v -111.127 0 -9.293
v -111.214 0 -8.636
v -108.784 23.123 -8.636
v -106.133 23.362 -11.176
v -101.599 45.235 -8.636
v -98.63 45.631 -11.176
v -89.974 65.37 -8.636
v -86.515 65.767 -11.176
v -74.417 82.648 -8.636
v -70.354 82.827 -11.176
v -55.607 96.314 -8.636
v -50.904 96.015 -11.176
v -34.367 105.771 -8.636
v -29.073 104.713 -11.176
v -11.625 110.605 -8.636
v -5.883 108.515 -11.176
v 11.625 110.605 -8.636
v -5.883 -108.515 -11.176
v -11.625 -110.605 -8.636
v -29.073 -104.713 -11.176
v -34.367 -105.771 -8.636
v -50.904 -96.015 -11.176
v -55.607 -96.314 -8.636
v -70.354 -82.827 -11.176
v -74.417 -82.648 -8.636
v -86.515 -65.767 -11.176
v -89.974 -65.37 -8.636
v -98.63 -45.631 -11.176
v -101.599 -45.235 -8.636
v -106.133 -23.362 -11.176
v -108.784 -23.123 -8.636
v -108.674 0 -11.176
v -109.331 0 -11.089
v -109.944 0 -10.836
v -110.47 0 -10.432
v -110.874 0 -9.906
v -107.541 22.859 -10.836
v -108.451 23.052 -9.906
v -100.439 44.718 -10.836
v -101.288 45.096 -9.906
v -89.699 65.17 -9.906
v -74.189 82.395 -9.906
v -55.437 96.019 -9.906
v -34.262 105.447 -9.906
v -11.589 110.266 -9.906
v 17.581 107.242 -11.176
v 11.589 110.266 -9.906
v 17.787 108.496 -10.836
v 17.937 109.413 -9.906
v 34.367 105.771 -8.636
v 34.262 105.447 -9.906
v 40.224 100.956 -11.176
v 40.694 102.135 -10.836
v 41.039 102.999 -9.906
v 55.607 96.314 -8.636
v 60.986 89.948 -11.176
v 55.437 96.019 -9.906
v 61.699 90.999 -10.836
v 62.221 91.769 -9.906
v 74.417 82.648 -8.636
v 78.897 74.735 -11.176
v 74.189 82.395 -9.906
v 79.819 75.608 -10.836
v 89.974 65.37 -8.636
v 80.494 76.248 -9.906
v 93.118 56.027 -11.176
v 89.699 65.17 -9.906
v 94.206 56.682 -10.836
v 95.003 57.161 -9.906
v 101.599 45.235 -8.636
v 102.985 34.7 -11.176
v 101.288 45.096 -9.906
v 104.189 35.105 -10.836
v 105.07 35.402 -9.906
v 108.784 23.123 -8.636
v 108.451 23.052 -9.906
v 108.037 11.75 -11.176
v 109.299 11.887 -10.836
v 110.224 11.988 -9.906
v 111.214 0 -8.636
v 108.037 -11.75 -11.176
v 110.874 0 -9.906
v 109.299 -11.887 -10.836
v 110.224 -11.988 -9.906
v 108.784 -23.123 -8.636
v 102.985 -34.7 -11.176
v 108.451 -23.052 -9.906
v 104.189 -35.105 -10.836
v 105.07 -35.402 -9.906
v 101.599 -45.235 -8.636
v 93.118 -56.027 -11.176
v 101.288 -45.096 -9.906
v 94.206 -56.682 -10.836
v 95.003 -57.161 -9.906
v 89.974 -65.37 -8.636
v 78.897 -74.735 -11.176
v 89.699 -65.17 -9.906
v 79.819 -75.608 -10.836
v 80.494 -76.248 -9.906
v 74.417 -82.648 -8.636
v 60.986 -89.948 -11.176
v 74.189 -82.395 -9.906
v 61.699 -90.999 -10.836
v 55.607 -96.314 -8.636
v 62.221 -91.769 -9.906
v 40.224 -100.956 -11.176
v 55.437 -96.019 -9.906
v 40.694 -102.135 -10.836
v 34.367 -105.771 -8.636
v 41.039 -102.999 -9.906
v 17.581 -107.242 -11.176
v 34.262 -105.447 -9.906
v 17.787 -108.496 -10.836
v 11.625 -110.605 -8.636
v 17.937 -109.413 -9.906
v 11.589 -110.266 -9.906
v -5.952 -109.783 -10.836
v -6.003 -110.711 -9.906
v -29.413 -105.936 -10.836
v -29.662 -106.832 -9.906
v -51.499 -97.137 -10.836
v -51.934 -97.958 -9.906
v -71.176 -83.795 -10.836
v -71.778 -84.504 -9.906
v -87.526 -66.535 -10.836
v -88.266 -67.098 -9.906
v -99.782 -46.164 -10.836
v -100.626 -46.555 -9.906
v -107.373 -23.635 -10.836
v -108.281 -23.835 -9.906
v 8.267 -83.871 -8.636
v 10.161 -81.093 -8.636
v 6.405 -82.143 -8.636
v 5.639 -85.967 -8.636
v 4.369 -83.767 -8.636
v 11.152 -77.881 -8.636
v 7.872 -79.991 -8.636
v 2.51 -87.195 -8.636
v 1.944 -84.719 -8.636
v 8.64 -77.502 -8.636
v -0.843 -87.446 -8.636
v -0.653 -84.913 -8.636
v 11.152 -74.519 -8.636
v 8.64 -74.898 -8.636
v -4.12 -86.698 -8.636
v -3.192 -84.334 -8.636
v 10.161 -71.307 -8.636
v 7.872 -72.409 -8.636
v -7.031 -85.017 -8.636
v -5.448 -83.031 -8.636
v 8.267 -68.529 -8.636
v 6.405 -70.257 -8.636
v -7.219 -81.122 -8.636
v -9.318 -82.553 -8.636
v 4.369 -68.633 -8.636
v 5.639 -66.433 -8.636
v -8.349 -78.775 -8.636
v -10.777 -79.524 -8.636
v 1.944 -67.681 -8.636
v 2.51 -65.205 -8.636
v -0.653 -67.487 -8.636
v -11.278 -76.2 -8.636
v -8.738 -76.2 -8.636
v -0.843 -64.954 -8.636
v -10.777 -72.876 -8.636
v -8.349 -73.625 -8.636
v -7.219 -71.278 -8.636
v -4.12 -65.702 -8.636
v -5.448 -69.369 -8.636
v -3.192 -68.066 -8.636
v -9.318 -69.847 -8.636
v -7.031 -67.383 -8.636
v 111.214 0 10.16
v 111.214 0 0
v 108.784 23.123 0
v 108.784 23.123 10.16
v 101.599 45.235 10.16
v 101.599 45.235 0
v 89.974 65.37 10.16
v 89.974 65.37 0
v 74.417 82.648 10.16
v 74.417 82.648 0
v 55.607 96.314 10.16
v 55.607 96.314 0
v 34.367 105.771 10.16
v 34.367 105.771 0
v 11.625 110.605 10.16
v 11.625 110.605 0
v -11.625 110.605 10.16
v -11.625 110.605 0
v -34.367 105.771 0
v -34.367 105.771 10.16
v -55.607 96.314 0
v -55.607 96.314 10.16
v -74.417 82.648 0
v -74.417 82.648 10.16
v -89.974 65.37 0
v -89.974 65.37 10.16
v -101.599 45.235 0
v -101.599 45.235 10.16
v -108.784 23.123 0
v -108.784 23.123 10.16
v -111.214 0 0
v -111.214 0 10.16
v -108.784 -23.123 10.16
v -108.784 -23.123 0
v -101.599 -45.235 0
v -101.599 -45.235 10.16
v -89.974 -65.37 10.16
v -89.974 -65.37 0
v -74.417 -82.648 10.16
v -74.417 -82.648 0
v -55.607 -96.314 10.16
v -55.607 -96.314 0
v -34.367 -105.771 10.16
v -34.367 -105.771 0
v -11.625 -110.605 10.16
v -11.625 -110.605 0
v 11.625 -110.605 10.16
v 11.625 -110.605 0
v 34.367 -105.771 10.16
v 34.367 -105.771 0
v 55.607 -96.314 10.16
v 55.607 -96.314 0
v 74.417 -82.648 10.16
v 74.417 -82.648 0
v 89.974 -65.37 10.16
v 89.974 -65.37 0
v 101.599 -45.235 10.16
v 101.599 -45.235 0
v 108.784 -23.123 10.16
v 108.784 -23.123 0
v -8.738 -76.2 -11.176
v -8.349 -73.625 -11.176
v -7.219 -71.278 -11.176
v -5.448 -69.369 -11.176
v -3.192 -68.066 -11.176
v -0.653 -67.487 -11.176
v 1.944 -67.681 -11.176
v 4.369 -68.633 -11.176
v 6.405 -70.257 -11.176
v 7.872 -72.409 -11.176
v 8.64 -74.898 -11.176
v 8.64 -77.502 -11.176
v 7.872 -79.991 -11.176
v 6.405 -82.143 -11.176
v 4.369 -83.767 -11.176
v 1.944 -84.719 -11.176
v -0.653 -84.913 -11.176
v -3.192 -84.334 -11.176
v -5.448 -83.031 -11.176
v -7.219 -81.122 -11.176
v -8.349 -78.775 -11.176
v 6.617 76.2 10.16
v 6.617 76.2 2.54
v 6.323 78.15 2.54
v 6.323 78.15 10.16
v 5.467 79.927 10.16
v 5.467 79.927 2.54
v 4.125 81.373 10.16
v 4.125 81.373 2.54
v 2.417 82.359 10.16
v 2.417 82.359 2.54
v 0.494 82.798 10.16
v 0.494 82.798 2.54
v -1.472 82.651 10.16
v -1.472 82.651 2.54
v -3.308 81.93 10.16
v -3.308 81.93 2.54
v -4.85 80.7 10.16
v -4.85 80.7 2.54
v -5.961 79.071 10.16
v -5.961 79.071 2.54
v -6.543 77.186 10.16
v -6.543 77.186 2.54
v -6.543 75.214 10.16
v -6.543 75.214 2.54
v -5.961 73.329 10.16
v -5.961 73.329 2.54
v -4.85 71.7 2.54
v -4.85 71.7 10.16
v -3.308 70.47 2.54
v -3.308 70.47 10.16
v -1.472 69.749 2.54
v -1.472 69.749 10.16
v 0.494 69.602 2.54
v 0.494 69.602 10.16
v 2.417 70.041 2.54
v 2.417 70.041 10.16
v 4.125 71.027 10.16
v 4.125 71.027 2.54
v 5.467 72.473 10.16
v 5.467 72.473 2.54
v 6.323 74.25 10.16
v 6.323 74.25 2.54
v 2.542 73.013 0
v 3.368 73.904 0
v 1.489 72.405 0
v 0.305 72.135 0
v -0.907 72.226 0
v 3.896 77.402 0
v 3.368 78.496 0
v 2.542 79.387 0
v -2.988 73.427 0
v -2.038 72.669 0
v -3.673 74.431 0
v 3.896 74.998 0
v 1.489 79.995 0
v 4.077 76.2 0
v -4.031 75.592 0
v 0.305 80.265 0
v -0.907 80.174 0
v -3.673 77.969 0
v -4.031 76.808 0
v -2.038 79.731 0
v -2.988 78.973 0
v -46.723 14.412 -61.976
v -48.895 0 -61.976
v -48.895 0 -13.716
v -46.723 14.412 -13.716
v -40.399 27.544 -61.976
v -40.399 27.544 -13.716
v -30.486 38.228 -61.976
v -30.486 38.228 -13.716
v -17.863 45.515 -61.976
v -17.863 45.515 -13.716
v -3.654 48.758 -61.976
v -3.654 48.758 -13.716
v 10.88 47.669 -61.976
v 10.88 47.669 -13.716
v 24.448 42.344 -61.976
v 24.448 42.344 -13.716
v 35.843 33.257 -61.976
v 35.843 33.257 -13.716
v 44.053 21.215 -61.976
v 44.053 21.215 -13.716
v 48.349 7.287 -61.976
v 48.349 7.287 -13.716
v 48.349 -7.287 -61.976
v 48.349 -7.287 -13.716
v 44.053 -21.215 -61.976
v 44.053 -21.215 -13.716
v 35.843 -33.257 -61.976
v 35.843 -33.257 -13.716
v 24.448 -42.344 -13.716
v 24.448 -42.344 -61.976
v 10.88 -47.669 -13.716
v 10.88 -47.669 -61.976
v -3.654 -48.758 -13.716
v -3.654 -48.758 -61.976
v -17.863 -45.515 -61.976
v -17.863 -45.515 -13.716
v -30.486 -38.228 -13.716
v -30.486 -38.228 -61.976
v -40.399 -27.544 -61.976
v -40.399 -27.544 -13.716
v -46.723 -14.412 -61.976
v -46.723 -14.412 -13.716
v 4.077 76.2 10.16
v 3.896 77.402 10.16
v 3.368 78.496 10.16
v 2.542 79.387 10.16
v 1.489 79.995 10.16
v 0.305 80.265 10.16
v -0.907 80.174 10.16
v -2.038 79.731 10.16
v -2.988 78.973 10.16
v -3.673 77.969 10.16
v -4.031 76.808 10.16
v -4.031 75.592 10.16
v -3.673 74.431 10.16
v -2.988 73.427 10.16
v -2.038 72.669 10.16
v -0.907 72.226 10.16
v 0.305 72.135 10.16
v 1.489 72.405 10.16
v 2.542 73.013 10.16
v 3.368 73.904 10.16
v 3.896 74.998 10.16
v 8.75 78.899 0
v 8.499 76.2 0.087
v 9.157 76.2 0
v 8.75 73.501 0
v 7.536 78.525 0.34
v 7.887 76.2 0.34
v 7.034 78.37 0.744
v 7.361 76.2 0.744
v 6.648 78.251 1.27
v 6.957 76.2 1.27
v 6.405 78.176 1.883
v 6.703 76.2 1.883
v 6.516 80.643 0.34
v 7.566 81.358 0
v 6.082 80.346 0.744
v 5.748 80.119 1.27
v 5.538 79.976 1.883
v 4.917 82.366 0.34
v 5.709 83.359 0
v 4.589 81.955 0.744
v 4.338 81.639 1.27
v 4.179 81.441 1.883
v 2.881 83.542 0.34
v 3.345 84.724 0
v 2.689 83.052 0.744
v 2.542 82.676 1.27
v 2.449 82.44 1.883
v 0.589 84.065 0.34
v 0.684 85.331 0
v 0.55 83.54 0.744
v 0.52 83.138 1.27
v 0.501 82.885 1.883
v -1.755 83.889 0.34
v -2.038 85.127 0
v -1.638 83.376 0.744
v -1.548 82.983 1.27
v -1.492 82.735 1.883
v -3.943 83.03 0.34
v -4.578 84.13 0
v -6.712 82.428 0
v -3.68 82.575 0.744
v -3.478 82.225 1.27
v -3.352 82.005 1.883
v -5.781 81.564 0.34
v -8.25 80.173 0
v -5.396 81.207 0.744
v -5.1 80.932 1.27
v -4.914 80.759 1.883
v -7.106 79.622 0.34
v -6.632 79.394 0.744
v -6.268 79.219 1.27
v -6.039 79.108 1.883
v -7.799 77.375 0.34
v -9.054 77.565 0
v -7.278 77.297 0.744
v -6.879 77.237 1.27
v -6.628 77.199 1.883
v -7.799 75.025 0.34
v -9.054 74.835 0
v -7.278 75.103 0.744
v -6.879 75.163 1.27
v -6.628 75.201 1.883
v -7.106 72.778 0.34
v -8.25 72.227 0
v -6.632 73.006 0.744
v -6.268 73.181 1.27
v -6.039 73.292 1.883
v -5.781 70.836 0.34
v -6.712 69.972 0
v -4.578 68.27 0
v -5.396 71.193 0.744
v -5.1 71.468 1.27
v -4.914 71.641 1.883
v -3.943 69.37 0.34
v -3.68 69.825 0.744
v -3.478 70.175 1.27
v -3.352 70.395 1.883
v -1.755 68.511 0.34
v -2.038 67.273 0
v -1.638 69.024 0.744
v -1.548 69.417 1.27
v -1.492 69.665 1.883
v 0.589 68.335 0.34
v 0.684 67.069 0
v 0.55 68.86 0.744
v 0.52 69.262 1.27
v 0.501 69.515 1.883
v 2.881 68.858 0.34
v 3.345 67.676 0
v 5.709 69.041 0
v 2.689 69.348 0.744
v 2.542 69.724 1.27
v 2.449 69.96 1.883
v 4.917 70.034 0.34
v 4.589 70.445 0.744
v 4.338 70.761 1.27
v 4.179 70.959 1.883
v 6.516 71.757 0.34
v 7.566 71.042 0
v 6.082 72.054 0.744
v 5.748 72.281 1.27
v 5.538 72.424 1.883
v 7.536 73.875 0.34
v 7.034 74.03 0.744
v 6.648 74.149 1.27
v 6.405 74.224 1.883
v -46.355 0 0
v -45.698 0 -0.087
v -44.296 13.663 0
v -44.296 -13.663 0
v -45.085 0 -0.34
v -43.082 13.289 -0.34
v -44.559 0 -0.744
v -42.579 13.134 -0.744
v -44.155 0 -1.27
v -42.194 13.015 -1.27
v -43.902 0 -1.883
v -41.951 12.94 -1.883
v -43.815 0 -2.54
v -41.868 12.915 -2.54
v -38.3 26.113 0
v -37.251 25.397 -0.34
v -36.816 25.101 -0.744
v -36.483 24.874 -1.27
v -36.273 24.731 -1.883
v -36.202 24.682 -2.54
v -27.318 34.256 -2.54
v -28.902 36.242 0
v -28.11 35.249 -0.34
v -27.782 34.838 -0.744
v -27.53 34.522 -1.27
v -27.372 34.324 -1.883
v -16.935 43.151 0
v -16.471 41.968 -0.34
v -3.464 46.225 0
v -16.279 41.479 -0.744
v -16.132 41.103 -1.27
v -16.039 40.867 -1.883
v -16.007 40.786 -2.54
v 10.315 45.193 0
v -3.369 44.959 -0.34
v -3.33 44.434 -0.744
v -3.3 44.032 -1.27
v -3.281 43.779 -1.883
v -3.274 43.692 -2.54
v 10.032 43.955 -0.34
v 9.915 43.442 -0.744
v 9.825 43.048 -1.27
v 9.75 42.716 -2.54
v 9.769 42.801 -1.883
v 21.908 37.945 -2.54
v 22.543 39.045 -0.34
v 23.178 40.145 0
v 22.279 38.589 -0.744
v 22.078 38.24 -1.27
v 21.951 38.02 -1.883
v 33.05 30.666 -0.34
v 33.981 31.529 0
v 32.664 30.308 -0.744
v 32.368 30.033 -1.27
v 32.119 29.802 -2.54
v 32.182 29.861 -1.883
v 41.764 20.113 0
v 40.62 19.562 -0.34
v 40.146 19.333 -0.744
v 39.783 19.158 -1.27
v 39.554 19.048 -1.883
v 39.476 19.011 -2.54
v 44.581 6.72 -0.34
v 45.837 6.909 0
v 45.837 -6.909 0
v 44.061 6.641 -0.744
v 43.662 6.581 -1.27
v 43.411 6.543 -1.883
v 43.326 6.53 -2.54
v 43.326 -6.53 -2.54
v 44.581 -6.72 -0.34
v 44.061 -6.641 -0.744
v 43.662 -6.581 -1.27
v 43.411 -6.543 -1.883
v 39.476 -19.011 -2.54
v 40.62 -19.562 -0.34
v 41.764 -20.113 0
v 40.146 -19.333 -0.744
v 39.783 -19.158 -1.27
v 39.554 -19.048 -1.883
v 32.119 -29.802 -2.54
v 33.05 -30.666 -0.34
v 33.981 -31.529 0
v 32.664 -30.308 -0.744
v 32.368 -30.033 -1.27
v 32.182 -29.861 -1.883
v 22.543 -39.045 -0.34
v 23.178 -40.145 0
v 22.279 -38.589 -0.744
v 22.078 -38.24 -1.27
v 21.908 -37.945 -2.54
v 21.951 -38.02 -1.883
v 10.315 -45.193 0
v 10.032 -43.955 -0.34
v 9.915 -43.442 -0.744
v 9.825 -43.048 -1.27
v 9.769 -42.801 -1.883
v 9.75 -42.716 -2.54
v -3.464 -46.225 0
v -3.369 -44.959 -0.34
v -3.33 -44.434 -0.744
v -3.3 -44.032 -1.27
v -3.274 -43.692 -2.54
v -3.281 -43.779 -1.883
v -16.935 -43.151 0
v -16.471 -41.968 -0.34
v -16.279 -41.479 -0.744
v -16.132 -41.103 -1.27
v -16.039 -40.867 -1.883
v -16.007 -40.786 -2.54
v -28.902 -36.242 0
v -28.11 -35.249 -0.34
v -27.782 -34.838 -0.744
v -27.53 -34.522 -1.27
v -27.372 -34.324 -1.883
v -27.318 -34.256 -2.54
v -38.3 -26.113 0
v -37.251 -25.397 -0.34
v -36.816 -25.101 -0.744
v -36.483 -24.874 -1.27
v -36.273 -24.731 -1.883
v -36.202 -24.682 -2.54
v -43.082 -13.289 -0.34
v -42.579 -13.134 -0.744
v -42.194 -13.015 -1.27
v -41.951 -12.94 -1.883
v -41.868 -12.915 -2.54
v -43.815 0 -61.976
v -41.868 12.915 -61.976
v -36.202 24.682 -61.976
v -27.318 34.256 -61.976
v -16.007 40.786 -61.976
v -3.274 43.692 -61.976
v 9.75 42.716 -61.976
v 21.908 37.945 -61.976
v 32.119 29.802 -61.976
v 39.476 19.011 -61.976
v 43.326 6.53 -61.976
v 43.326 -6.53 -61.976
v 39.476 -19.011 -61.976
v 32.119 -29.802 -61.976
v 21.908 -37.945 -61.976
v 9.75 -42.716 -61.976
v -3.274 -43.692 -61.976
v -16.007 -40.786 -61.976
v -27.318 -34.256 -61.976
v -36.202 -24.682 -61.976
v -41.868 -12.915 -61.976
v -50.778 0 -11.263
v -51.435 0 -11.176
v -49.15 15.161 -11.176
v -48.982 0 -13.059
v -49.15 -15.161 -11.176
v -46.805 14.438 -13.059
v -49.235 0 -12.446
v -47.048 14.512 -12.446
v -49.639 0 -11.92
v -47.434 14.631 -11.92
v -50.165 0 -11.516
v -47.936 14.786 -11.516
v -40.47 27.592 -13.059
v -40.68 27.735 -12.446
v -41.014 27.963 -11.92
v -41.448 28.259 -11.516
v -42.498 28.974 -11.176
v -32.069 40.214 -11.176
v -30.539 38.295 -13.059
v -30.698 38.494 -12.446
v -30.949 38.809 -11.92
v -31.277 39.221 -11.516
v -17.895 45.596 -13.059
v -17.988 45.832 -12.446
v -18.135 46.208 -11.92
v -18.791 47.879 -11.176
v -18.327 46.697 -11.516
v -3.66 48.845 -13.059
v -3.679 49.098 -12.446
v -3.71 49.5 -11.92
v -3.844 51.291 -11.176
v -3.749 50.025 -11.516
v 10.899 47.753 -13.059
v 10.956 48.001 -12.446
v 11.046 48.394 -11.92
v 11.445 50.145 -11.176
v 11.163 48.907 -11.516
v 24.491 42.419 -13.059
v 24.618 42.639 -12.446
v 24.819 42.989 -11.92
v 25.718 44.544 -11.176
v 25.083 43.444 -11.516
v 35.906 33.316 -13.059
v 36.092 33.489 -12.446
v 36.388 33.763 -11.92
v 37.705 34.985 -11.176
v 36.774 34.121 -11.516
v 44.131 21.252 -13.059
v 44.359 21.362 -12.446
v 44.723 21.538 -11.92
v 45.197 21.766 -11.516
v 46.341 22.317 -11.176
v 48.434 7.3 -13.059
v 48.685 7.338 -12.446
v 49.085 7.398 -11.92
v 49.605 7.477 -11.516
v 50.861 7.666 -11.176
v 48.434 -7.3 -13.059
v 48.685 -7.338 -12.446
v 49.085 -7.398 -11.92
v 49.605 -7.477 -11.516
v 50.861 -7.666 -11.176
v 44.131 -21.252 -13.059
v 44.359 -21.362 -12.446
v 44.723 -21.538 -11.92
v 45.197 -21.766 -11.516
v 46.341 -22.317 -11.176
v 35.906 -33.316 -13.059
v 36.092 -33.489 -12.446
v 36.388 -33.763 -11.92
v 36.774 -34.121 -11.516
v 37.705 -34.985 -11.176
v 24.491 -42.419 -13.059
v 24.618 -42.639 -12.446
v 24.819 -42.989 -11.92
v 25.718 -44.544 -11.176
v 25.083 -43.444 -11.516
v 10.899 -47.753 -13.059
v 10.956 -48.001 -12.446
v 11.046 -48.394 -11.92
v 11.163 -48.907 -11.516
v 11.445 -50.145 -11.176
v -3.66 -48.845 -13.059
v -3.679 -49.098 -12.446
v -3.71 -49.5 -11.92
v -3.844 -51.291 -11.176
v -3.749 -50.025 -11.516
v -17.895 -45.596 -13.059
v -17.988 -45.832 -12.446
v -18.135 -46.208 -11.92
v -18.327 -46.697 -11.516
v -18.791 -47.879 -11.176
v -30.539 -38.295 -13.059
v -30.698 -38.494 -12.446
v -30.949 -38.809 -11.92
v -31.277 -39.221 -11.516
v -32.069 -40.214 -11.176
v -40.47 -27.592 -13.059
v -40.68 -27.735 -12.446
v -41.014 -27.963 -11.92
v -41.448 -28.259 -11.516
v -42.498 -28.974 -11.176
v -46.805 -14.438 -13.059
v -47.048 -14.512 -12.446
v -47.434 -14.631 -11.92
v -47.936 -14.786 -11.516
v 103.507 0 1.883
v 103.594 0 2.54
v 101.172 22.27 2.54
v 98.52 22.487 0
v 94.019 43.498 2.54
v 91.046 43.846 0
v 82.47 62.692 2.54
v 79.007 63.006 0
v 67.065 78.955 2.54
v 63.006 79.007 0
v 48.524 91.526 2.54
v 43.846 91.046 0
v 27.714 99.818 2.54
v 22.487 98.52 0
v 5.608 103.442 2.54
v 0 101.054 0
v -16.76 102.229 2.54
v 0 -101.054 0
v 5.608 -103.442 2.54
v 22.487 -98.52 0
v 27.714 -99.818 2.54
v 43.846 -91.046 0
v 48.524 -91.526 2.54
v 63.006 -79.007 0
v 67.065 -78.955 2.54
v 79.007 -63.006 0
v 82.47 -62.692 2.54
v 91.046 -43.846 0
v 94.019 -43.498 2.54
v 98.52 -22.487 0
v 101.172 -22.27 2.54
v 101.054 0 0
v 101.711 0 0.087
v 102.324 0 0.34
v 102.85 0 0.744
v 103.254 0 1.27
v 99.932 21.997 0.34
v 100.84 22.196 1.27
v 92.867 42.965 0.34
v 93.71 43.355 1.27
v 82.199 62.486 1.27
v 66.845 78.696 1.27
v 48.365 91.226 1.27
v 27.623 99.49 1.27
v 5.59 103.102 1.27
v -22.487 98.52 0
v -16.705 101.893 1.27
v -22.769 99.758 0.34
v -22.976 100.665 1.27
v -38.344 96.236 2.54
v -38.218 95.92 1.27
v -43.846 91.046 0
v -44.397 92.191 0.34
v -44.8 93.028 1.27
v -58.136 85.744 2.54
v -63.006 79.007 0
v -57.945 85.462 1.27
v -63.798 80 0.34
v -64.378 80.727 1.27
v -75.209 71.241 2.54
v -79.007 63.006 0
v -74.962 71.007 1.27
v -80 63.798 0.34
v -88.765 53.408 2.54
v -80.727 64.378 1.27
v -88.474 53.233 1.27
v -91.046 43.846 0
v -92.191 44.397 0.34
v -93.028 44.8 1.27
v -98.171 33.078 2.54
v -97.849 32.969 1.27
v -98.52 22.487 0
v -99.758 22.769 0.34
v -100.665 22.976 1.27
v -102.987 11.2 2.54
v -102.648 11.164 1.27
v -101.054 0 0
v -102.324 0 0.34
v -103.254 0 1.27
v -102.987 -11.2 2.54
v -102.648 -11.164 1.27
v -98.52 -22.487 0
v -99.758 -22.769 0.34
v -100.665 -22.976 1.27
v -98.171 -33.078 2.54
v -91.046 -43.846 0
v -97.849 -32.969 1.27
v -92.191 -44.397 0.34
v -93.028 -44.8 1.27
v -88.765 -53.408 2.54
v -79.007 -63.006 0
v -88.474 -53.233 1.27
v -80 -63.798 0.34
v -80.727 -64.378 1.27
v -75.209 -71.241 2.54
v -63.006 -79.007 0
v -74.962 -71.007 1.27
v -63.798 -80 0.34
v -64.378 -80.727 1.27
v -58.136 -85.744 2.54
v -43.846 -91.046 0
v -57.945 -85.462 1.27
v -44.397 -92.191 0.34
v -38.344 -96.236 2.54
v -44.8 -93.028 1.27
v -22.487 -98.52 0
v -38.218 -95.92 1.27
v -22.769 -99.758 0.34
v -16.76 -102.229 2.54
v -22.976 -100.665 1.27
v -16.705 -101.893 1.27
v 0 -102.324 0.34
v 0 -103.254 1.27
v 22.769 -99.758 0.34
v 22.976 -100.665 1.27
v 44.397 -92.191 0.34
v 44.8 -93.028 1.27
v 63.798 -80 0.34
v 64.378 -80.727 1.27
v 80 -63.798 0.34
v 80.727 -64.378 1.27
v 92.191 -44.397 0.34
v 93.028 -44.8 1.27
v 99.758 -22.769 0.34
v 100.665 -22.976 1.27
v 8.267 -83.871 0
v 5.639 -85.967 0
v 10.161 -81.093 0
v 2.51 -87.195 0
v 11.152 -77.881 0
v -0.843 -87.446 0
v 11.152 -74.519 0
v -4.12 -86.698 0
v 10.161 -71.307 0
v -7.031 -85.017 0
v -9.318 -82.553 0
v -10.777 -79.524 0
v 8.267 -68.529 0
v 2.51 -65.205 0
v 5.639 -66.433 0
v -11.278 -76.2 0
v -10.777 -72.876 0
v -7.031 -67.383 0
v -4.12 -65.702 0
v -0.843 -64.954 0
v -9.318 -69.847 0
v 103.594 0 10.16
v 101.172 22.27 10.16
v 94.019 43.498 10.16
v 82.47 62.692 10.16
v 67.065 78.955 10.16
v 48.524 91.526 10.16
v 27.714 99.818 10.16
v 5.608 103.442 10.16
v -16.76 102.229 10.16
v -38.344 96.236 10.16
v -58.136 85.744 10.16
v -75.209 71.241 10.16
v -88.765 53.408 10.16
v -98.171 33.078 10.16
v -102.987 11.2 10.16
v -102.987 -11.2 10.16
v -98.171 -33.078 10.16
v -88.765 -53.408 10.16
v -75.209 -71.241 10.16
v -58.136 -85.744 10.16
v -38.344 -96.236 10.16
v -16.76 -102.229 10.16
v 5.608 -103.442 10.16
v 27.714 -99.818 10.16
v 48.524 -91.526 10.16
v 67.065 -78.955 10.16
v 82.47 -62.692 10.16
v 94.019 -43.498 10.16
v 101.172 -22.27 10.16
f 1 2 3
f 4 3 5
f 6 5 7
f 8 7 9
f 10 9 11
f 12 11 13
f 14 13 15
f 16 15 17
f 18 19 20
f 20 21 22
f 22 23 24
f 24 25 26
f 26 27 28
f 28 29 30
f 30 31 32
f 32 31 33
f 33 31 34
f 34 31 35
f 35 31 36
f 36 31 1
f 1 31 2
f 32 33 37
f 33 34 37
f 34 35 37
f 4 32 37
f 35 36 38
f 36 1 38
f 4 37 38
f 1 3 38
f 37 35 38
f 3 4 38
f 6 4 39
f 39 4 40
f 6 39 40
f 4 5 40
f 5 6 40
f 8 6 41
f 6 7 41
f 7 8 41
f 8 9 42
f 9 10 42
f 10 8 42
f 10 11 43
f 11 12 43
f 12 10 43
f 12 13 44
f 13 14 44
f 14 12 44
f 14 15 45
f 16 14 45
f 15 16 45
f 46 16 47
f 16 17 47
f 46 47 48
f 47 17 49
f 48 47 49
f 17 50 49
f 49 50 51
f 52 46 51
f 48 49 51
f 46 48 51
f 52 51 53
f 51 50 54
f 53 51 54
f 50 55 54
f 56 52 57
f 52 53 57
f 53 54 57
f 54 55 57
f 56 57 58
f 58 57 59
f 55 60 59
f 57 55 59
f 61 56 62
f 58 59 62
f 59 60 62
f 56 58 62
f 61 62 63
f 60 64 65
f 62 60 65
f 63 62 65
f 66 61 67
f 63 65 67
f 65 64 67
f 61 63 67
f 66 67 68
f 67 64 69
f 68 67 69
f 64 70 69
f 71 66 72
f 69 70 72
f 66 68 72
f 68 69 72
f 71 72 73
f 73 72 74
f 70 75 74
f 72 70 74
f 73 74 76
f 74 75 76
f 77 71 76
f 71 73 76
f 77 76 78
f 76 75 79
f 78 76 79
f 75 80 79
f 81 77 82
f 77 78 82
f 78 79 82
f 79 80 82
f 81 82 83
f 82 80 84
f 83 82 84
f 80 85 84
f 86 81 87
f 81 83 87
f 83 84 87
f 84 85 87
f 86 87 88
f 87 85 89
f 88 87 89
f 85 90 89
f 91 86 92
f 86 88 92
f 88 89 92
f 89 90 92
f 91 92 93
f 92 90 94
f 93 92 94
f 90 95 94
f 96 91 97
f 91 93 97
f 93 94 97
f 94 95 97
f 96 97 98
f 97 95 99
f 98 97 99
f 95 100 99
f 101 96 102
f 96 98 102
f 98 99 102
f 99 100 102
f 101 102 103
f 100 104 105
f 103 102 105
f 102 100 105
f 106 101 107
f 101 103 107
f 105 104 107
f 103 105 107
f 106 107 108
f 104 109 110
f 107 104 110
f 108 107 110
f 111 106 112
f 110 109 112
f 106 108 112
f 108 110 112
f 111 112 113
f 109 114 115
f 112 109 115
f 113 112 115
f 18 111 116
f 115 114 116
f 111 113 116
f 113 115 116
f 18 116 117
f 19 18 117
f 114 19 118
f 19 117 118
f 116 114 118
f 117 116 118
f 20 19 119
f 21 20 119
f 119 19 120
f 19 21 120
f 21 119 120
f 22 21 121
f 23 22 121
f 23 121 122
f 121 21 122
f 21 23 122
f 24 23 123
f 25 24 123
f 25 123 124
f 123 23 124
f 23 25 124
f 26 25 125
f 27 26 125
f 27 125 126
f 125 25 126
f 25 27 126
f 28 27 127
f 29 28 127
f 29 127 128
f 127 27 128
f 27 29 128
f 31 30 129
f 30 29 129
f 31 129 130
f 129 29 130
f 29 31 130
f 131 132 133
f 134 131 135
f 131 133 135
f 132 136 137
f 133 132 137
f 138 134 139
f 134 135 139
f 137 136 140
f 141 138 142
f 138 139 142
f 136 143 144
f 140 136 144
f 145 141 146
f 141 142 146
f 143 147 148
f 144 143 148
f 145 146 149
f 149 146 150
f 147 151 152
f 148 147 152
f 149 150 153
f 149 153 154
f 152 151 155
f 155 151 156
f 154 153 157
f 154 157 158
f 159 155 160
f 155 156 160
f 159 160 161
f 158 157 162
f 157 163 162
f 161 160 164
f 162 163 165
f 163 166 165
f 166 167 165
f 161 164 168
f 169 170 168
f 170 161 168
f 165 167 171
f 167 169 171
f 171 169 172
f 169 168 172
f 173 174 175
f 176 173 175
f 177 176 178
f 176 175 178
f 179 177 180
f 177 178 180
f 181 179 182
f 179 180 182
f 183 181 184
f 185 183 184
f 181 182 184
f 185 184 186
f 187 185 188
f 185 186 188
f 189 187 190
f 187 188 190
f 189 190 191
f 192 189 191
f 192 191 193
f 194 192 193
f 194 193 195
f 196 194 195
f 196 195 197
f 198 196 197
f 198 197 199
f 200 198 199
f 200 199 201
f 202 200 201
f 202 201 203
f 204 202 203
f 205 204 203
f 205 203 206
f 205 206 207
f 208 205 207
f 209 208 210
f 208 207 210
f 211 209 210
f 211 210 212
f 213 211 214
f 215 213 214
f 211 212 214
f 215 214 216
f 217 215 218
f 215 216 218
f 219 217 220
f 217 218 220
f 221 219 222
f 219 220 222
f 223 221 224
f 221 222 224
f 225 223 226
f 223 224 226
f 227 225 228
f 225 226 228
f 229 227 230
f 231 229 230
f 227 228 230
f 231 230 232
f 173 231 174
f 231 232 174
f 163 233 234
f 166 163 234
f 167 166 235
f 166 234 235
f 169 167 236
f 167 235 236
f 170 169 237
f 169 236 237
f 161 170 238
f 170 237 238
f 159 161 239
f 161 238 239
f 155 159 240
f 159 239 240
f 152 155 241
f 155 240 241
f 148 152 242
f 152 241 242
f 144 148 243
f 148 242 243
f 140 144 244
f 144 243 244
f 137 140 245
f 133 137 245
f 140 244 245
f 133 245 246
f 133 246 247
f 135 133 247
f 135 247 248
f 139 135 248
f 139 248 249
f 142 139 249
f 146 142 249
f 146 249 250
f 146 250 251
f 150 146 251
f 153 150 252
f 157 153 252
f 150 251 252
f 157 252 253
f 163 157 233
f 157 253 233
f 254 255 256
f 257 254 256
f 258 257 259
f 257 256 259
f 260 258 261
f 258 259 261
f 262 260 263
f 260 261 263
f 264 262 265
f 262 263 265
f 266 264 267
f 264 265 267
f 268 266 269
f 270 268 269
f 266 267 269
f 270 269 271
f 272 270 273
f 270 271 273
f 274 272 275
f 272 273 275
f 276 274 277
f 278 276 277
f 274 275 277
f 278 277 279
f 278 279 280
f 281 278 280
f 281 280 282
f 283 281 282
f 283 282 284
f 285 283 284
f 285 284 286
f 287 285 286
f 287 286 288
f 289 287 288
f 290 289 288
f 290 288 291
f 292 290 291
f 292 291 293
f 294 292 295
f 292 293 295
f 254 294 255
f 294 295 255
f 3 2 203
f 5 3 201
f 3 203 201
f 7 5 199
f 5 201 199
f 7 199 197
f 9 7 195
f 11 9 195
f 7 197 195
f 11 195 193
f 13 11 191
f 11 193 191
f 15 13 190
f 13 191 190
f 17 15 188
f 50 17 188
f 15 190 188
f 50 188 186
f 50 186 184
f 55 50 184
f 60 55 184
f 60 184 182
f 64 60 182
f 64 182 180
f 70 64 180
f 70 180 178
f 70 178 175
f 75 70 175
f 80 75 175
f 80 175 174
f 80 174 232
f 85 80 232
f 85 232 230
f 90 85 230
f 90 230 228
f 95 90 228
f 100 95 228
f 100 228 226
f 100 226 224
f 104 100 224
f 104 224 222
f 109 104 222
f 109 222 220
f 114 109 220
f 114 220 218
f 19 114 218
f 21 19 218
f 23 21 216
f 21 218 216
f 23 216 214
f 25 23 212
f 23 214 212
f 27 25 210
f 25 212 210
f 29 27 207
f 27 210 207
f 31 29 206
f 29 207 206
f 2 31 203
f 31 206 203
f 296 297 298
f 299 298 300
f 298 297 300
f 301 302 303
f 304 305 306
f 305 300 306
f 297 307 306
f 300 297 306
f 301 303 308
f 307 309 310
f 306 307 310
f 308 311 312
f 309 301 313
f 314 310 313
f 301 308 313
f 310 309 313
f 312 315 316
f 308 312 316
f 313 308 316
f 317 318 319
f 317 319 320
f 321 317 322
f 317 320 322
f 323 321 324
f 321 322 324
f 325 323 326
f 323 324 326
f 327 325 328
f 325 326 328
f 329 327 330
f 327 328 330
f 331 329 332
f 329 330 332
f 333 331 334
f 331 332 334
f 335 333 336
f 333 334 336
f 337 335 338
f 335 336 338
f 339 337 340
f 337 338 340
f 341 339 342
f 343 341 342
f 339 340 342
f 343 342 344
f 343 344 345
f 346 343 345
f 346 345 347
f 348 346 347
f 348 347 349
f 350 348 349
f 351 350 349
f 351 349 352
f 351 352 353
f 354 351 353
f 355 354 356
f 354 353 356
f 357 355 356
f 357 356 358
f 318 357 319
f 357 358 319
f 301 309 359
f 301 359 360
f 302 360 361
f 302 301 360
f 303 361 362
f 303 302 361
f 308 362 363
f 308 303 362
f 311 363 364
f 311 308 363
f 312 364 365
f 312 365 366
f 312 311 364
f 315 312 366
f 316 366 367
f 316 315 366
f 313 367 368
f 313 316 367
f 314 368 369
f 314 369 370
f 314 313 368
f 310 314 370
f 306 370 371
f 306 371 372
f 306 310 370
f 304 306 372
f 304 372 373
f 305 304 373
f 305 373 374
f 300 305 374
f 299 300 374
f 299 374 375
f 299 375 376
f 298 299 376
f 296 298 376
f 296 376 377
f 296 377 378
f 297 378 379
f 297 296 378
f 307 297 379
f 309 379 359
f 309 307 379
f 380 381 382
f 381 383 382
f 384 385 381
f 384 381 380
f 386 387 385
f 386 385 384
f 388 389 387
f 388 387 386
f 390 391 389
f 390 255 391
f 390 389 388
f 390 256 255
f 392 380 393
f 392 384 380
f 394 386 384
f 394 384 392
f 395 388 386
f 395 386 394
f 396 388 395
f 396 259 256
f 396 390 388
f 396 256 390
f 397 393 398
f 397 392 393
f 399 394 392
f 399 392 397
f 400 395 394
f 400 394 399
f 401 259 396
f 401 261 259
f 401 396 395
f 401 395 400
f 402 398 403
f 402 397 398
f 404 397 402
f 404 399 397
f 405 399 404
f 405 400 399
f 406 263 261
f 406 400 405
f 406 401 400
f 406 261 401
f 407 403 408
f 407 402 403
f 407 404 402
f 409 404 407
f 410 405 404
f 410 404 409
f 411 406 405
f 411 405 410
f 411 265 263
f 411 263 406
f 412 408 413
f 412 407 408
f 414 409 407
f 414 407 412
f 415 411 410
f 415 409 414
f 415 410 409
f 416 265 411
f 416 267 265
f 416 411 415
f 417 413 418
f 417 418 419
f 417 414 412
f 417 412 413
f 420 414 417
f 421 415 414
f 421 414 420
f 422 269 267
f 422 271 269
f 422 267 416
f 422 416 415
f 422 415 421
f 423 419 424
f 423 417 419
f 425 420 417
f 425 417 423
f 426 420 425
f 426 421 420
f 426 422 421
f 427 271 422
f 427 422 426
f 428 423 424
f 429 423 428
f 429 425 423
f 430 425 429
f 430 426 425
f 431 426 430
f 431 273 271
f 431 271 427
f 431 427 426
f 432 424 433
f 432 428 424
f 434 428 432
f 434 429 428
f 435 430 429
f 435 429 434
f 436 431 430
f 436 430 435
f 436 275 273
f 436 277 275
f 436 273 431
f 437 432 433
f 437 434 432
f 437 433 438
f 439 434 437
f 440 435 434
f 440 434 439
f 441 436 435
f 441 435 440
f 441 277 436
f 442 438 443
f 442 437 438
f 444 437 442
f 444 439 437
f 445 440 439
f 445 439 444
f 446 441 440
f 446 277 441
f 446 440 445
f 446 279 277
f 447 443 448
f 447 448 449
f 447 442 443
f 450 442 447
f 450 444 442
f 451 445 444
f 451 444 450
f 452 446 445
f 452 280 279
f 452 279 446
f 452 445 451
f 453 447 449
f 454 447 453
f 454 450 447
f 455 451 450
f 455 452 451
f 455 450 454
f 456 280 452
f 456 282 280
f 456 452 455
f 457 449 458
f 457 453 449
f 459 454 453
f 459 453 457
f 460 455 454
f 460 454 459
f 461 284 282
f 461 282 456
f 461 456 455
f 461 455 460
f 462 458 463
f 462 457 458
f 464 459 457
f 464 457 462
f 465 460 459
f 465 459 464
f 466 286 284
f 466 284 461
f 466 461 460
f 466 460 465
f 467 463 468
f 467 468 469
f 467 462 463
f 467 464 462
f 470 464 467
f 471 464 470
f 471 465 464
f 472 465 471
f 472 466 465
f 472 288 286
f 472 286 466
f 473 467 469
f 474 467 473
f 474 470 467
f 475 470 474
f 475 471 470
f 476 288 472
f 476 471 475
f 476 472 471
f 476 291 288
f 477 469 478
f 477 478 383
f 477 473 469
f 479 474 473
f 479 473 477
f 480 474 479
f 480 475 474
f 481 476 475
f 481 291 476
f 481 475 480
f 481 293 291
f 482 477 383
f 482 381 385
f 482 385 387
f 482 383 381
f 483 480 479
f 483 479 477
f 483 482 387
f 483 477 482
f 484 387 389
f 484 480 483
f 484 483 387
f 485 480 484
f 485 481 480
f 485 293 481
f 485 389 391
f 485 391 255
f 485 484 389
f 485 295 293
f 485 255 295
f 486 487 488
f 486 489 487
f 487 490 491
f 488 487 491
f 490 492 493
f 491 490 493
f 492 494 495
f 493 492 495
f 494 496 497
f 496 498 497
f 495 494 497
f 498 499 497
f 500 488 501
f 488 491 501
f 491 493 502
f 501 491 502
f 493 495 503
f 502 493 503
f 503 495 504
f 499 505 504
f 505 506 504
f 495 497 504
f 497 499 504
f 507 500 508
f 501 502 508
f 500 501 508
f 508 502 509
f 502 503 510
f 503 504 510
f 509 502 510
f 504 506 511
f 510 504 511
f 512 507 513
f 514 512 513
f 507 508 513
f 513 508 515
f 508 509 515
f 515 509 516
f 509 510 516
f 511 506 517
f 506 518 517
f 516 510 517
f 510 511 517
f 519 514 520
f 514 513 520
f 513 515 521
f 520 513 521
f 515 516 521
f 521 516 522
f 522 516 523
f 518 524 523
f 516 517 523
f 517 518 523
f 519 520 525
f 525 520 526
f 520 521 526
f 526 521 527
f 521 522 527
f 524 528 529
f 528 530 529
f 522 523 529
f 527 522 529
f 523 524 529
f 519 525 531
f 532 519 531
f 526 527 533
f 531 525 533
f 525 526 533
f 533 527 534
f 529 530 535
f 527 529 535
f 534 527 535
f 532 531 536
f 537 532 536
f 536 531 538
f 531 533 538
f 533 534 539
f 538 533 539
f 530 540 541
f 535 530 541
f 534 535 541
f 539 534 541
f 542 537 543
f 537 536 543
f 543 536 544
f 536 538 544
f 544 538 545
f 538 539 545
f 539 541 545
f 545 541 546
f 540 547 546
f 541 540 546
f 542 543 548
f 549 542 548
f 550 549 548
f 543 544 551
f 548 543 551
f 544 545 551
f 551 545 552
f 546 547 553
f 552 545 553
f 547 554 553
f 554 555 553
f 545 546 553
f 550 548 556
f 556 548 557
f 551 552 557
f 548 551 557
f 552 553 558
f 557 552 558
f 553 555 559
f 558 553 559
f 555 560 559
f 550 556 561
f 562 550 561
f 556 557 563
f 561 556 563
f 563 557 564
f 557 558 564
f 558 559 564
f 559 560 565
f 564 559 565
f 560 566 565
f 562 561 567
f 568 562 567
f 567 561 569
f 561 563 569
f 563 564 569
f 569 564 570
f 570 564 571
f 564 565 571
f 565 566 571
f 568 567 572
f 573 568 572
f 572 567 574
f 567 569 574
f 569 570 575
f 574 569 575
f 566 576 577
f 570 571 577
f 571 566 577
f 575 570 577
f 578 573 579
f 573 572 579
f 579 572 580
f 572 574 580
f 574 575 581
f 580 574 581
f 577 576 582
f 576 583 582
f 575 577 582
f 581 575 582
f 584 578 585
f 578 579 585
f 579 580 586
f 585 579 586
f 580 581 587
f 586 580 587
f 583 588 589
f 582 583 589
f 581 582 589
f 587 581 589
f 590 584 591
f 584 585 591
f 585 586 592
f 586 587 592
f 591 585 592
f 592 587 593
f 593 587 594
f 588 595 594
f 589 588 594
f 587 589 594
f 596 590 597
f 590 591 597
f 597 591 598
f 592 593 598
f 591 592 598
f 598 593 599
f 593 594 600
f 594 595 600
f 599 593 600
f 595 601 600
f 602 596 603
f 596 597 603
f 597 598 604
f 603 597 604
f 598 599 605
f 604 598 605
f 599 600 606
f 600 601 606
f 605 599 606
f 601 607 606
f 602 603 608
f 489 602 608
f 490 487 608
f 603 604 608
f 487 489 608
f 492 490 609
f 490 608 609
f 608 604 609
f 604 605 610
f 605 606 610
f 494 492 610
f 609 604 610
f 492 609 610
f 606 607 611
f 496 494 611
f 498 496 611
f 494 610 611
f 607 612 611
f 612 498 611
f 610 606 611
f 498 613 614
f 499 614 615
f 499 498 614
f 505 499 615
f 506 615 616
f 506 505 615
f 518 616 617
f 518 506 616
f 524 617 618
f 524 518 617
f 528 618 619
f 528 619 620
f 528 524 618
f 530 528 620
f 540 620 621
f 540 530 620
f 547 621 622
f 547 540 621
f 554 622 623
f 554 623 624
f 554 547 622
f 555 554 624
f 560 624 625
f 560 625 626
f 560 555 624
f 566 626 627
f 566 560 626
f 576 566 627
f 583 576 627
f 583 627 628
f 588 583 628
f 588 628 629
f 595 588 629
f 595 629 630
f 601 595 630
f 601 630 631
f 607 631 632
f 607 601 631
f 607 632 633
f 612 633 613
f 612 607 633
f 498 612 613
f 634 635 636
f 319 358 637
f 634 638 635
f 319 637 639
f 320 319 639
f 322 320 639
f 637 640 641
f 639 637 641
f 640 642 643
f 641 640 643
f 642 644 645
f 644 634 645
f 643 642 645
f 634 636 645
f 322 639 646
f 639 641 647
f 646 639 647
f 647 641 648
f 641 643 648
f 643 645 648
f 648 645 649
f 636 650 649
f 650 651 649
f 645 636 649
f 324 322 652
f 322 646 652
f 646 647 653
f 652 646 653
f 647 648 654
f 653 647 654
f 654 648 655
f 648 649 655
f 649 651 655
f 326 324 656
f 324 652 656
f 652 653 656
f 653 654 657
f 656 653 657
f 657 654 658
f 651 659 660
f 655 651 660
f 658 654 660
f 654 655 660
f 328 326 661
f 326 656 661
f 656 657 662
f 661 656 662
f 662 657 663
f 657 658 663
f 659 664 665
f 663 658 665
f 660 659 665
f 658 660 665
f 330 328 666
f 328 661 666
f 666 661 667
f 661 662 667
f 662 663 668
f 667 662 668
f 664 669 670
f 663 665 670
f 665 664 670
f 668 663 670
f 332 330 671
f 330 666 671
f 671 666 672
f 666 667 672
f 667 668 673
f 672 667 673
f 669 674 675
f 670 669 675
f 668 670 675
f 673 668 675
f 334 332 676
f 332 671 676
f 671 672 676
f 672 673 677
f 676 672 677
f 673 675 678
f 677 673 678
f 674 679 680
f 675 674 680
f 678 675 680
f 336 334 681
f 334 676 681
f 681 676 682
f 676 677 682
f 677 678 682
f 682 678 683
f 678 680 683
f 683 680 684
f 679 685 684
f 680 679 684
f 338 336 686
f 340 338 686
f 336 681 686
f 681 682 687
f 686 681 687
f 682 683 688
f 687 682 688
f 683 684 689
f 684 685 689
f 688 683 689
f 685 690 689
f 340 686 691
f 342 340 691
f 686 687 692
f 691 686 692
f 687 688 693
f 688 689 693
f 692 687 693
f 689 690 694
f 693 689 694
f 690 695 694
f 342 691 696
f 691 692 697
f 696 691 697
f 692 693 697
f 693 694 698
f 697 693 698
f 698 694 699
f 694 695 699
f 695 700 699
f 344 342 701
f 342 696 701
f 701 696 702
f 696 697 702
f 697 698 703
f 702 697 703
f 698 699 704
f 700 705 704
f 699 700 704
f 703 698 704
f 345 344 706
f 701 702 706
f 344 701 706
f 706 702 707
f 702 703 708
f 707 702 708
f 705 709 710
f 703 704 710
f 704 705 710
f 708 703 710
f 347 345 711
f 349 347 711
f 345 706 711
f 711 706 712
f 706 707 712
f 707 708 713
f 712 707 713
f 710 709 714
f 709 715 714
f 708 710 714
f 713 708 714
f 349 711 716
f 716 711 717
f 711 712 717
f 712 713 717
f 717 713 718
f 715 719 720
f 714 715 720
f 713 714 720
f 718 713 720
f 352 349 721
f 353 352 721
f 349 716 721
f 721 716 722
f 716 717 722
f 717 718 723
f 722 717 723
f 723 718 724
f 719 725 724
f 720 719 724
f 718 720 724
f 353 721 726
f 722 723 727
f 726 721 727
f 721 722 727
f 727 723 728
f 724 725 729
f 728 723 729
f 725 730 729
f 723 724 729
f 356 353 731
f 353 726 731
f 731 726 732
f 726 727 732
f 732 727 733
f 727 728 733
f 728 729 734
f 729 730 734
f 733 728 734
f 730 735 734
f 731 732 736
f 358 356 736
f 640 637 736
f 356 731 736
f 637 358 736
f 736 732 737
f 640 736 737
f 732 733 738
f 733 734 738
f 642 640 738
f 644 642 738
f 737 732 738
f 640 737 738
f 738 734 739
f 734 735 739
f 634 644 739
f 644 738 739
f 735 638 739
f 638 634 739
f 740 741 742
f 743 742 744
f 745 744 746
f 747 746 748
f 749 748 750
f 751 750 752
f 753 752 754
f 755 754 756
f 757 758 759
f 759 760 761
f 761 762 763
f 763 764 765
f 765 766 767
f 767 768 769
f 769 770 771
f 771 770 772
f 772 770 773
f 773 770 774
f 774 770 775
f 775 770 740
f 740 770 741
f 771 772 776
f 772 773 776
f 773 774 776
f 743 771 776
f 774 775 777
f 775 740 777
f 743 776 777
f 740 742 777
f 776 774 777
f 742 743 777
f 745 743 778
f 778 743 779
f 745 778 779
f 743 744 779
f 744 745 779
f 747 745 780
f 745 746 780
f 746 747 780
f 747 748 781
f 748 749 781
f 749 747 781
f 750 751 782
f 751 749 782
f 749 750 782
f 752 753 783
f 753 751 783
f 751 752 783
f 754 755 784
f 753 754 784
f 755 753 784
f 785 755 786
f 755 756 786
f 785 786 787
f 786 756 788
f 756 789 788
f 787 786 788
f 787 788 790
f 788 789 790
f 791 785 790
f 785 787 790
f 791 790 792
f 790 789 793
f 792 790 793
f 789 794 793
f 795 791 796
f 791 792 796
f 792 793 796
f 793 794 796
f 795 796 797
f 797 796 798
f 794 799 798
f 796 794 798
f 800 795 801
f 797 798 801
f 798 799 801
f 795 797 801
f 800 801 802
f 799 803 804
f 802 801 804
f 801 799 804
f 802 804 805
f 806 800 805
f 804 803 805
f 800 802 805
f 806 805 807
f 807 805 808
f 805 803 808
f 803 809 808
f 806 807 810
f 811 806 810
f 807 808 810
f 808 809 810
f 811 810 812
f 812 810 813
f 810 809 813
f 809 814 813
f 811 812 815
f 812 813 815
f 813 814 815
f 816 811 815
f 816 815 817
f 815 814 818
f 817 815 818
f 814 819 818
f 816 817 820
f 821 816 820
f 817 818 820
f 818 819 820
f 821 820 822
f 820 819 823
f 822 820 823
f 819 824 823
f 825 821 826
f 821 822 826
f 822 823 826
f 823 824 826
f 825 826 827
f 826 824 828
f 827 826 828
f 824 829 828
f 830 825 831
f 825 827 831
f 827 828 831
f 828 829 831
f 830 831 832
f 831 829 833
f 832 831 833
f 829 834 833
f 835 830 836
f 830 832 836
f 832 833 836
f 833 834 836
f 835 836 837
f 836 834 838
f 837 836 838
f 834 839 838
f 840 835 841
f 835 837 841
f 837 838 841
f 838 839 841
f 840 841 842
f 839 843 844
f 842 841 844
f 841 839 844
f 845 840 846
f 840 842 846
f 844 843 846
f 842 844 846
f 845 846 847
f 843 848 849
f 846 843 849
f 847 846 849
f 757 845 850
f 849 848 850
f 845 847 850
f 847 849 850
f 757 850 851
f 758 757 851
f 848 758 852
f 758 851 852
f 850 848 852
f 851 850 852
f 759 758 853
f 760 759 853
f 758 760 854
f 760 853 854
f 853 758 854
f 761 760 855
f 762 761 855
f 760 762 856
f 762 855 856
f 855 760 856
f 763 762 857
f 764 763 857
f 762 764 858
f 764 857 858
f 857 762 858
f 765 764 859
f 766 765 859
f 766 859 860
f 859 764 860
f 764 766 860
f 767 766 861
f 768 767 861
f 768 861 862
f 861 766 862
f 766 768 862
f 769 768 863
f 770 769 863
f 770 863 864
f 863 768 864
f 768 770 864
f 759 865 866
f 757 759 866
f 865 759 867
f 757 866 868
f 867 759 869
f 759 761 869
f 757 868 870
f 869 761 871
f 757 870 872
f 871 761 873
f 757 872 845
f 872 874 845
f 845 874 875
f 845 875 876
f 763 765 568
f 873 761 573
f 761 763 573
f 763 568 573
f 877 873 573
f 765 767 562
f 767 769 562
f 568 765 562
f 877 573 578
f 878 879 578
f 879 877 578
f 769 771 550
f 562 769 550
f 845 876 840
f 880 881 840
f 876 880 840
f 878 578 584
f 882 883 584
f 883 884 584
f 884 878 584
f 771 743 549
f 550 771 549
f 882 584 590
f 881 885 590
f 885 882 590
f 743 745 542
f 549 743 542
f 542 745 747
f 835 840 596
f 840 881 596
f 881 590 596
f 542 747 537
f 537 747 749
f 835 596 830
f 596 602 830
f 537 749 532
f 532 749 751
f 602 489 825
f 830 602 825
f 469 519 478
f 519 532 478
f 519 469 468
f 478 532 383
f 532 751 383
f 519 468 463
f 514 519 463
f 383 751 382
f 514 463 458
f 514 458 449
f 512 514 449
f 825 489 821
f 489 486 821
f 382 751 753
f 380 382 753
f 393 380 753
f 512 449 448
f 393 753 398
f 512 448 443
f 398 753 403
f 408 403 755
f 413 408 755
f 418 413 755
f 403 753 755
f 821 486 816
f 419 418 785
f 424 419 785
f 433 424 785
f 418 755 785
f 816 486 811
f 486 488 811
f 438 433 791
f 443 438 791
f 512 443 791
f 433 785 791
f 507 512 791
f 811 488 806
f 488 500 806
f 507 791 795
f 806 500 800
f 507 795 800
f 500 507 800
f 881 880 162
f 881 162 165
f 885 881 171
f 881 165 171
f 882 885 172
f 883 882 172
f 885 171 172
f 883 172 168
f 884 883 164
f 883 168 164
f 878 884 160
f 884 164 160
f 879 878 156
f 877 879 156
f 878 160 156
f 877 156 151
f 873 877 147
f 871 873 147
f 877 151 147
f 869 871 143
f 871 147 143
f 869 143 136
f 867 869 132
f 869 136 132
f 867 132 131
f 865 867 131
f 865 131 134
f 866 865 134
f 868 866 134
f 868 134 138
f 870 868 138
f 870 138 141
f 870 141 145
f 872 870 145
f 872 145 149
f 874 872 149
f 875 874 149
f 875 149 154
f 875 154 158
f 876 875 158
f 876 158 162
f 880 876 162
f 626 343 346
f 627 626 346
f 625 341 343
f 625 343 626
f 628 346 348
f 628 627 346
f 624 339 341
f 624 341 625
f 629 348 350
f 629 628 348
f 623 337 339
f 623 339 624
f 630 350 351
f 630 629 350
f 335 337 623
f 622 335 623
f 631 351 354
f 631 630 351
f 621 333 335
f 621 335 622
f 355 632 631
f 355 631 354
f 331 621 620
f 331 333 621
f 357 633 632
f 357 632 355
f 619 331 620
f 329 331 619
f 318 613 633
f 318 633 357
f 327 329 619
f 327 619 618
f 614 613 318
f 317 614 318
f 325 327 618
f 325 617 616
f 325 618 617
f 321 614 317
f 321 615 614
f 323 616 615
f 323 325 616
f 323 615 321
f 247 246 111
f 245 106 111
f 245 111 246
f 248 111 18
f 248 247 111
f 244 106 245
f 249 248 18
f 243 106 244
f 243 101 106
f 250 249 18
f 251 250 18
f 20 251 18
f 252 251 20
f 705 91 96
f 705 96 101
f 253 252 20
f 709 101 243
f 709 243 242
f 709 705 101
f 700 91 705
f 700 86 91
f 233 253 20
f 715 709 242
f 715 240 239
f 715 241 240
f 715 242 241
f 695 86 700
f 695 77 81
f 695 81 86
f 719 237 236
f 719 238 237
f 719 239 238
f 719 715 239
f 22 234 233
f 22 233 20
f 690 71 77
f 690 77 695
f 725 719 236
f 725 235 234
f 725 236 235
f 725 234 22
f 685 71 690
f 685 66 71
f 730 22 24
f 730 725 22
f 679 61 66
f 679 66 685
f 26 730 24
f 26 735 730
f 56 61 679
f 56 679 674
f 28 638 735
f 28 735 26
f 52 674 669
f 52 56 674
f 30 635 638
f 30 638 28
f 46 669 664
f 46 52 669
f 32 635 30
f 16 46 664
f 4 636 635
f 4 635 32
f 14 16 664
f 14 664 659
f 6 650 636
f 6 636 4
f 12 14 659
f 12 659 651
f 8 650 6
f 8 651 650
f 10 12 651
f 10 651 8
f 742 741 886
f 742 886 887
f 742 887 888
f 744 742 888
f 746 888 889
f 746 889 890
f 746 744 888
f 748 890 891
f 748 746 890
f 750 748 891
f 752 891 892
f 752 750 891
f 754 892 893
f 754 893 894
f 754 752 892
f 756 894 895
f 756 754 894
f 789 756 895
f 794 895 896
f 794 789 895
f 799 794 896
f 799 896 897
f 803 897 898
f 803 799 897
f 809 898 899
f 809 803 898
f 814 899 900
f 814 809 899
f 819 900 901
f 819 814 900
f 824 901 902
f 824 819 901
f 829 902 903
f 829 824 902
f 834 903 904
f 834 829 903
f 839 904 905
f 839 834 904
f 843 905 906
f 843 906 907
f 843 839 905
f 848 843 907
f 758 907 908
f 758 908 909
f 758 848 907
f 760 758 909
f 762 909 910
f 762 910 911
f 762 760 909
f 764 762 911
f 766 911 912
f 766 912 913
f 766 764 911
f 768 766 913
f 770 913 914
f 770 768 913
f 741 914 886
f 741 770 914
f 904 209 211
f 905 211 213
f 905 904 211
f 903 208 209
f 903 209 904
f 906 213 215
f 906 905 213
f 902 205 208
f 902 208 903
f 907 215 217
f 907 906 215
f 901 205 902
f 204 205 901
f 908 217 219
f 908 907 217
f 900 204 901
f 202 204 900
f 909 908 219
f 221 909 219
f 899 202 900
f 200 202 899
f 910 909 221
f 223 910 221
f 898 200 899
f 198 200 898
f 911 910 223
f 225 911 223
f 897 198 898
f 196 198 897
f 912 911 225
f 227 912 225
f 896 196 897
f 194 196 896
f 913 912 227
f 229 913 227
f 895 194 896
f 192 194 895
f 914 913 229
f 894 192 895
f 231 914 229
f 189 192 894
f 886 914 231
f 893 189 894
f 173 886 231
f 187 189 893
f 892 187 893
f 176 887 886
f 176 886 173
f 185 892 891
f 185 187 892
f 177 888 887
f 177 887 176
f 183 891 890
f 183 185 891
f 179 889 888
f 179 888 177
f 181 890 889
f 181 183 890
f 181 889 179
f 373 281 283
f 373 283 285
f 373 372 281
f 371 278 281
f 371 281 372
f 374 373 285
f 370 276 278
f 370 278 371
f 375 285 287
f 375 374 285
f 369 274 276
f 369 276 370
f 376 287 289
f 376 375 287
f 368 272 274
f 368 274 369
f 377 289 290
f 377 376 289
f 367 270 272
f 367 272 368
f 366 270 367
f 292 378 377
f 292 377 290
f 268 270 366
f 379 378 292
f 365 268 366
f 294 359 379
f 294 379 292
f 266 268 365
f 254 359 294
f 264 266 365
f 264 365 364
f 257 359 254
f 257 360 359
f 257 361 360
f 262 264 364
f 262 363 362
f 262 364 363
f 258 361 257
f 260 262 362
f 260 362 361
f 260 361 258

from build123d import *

# Parameters (mm, degrees)
SKETCH1_R           = 111.2139
SKETCH1_R_2         = 103.5939
BOSS_EXTRUDE1_DEPTH = 10.16
SKETCH2_R           = 111.2139
SKETCH2_R_2         = 43.815
BOSS_EXTRUDE3_DEPTH = 11.176
SKETCH3_R           = 48.895
SKETCH3_R_2         = 43.815
BOSS_EXTRUDE4_DEPTH = 50.8
FILLET1_R           = 2.54
FILLET2_R           = 2.54
SKETCH4_R           = 11.2776
CUT_EXTRUDE1_DEPTH  = 50.8
SKETCH5_R           = 6.6167
SKETCH5_R_2         = 4.0767
BOSS_EXTRUDE5_DEPTH = 10.16
FILLET3_R           = 2.54
SKETCH6_R           = 11.2776
SKETCH6_R_2         = 8.7376
BOSS_EXTRUDE6_DEPTH = 2.54


with BuildPart() as part:
    # Sketch1 → Boss-Extrude1 (new body)
    with BuildSketch(Plane.XY):
        Circle(SKETCH1_R)
        Circle(SKETCH1_R_2, mode=Mode.SUBTRACT)
    extrude(amount=BOSS_EXTRUDE1_DEPTH)

    # Sketch2 → Boss-Extrude3 (add)
    with BuildSketch(Plane(origin=(0, 0, 0), x_dir=(-1, 0, 0), z_dir=(0, 0, -1))):
        Circle(SKETCH2_R)
        Circle(SKETCH2_R_2, mode=Mode.SUBTRACT)
    extrude(amount=BOSS_EXTRUDE3_DEPTH)

    # Sketch3 → Boss-Extrude4 (add)
    with BuildSketch(Plane(origin=(0, 0, -11.176), x_dir=(-1, 0, 0), z_dir=(0, 0, -1))):
        Circle(SKETCH3_R)
        Circle(SKETCH3_R_2, mode=Mode.SUBTRACT)
    extrude(amount=BOSS_EXTRUDE4_DEPTH)

    # Fillet1
    fillet1_edges = [part.edges().sort_by_distance(p)[0] for p in [
        (-103.5939, 0, 0),
    ]]
    fillet(fillet1_edges, radius=FILLET1_R)

    # Fillet2
    fillet2_edges = [part.edges().sort_by_distance(p)[0] for p in [
        (48.895, 0, -11.176),
        (43.815, 0, 0),
        (111.2139, 0, -11.176),
    ]]
    fillet(fillet2_edges, radius=FILLET2_R)

    # Sketch4 → Cut-Extrude1 (cut)
    with BuildSketch(Plane(origin=(0, 0, -11.176), x_dir=(-1, 0, 0), z_dir=(0, 0, -1))):
        with Locations((0, -76.2)):
            Circle(SKETCH4_R)
    extrude(amount=-CUT_EXTRUDE1_DEPTH, mode=Mode.SUBTRACT)

    # Sketch5 → Boss-Extrude5 (add)
    with BuildSketch(Plane.XY):
        with Locations((0, 76.2)):
            Circle(SKETCH5_R)
        with Locations((0, 76.2)):
            Circle(SKETCH5_R_2, mode=Mode.SUBTRACT)
    extrude(amount=BOSS_EXTRUDE5_DEPTH)

    # Fillet3
    fillet3_edges = [part.edges().sort_by_distance(p)[0] for p in [
        (-6.6167, 76.2, 0),
    ]]
    fillet(fillet3_edges, radius=FILLET3_R)

    # Sketch6 → Boss-Extrude6 (add)
    with BuildSketch(Plane(origin=(0, 0, -11.176), x_dir=(-1, 0, 0), z_dir=(0, 0, -1))):
        with Locations((0, -76.2)):
            Circle(SKETCH6_R)
        with Locations((0, -76.2)):
            Circle(SKETCH6_R_2, mode=Mode.SUBTRACT)
    extrude(amount=-BOSS_EXTRUDE6_DEPTH)


solid = part.part
